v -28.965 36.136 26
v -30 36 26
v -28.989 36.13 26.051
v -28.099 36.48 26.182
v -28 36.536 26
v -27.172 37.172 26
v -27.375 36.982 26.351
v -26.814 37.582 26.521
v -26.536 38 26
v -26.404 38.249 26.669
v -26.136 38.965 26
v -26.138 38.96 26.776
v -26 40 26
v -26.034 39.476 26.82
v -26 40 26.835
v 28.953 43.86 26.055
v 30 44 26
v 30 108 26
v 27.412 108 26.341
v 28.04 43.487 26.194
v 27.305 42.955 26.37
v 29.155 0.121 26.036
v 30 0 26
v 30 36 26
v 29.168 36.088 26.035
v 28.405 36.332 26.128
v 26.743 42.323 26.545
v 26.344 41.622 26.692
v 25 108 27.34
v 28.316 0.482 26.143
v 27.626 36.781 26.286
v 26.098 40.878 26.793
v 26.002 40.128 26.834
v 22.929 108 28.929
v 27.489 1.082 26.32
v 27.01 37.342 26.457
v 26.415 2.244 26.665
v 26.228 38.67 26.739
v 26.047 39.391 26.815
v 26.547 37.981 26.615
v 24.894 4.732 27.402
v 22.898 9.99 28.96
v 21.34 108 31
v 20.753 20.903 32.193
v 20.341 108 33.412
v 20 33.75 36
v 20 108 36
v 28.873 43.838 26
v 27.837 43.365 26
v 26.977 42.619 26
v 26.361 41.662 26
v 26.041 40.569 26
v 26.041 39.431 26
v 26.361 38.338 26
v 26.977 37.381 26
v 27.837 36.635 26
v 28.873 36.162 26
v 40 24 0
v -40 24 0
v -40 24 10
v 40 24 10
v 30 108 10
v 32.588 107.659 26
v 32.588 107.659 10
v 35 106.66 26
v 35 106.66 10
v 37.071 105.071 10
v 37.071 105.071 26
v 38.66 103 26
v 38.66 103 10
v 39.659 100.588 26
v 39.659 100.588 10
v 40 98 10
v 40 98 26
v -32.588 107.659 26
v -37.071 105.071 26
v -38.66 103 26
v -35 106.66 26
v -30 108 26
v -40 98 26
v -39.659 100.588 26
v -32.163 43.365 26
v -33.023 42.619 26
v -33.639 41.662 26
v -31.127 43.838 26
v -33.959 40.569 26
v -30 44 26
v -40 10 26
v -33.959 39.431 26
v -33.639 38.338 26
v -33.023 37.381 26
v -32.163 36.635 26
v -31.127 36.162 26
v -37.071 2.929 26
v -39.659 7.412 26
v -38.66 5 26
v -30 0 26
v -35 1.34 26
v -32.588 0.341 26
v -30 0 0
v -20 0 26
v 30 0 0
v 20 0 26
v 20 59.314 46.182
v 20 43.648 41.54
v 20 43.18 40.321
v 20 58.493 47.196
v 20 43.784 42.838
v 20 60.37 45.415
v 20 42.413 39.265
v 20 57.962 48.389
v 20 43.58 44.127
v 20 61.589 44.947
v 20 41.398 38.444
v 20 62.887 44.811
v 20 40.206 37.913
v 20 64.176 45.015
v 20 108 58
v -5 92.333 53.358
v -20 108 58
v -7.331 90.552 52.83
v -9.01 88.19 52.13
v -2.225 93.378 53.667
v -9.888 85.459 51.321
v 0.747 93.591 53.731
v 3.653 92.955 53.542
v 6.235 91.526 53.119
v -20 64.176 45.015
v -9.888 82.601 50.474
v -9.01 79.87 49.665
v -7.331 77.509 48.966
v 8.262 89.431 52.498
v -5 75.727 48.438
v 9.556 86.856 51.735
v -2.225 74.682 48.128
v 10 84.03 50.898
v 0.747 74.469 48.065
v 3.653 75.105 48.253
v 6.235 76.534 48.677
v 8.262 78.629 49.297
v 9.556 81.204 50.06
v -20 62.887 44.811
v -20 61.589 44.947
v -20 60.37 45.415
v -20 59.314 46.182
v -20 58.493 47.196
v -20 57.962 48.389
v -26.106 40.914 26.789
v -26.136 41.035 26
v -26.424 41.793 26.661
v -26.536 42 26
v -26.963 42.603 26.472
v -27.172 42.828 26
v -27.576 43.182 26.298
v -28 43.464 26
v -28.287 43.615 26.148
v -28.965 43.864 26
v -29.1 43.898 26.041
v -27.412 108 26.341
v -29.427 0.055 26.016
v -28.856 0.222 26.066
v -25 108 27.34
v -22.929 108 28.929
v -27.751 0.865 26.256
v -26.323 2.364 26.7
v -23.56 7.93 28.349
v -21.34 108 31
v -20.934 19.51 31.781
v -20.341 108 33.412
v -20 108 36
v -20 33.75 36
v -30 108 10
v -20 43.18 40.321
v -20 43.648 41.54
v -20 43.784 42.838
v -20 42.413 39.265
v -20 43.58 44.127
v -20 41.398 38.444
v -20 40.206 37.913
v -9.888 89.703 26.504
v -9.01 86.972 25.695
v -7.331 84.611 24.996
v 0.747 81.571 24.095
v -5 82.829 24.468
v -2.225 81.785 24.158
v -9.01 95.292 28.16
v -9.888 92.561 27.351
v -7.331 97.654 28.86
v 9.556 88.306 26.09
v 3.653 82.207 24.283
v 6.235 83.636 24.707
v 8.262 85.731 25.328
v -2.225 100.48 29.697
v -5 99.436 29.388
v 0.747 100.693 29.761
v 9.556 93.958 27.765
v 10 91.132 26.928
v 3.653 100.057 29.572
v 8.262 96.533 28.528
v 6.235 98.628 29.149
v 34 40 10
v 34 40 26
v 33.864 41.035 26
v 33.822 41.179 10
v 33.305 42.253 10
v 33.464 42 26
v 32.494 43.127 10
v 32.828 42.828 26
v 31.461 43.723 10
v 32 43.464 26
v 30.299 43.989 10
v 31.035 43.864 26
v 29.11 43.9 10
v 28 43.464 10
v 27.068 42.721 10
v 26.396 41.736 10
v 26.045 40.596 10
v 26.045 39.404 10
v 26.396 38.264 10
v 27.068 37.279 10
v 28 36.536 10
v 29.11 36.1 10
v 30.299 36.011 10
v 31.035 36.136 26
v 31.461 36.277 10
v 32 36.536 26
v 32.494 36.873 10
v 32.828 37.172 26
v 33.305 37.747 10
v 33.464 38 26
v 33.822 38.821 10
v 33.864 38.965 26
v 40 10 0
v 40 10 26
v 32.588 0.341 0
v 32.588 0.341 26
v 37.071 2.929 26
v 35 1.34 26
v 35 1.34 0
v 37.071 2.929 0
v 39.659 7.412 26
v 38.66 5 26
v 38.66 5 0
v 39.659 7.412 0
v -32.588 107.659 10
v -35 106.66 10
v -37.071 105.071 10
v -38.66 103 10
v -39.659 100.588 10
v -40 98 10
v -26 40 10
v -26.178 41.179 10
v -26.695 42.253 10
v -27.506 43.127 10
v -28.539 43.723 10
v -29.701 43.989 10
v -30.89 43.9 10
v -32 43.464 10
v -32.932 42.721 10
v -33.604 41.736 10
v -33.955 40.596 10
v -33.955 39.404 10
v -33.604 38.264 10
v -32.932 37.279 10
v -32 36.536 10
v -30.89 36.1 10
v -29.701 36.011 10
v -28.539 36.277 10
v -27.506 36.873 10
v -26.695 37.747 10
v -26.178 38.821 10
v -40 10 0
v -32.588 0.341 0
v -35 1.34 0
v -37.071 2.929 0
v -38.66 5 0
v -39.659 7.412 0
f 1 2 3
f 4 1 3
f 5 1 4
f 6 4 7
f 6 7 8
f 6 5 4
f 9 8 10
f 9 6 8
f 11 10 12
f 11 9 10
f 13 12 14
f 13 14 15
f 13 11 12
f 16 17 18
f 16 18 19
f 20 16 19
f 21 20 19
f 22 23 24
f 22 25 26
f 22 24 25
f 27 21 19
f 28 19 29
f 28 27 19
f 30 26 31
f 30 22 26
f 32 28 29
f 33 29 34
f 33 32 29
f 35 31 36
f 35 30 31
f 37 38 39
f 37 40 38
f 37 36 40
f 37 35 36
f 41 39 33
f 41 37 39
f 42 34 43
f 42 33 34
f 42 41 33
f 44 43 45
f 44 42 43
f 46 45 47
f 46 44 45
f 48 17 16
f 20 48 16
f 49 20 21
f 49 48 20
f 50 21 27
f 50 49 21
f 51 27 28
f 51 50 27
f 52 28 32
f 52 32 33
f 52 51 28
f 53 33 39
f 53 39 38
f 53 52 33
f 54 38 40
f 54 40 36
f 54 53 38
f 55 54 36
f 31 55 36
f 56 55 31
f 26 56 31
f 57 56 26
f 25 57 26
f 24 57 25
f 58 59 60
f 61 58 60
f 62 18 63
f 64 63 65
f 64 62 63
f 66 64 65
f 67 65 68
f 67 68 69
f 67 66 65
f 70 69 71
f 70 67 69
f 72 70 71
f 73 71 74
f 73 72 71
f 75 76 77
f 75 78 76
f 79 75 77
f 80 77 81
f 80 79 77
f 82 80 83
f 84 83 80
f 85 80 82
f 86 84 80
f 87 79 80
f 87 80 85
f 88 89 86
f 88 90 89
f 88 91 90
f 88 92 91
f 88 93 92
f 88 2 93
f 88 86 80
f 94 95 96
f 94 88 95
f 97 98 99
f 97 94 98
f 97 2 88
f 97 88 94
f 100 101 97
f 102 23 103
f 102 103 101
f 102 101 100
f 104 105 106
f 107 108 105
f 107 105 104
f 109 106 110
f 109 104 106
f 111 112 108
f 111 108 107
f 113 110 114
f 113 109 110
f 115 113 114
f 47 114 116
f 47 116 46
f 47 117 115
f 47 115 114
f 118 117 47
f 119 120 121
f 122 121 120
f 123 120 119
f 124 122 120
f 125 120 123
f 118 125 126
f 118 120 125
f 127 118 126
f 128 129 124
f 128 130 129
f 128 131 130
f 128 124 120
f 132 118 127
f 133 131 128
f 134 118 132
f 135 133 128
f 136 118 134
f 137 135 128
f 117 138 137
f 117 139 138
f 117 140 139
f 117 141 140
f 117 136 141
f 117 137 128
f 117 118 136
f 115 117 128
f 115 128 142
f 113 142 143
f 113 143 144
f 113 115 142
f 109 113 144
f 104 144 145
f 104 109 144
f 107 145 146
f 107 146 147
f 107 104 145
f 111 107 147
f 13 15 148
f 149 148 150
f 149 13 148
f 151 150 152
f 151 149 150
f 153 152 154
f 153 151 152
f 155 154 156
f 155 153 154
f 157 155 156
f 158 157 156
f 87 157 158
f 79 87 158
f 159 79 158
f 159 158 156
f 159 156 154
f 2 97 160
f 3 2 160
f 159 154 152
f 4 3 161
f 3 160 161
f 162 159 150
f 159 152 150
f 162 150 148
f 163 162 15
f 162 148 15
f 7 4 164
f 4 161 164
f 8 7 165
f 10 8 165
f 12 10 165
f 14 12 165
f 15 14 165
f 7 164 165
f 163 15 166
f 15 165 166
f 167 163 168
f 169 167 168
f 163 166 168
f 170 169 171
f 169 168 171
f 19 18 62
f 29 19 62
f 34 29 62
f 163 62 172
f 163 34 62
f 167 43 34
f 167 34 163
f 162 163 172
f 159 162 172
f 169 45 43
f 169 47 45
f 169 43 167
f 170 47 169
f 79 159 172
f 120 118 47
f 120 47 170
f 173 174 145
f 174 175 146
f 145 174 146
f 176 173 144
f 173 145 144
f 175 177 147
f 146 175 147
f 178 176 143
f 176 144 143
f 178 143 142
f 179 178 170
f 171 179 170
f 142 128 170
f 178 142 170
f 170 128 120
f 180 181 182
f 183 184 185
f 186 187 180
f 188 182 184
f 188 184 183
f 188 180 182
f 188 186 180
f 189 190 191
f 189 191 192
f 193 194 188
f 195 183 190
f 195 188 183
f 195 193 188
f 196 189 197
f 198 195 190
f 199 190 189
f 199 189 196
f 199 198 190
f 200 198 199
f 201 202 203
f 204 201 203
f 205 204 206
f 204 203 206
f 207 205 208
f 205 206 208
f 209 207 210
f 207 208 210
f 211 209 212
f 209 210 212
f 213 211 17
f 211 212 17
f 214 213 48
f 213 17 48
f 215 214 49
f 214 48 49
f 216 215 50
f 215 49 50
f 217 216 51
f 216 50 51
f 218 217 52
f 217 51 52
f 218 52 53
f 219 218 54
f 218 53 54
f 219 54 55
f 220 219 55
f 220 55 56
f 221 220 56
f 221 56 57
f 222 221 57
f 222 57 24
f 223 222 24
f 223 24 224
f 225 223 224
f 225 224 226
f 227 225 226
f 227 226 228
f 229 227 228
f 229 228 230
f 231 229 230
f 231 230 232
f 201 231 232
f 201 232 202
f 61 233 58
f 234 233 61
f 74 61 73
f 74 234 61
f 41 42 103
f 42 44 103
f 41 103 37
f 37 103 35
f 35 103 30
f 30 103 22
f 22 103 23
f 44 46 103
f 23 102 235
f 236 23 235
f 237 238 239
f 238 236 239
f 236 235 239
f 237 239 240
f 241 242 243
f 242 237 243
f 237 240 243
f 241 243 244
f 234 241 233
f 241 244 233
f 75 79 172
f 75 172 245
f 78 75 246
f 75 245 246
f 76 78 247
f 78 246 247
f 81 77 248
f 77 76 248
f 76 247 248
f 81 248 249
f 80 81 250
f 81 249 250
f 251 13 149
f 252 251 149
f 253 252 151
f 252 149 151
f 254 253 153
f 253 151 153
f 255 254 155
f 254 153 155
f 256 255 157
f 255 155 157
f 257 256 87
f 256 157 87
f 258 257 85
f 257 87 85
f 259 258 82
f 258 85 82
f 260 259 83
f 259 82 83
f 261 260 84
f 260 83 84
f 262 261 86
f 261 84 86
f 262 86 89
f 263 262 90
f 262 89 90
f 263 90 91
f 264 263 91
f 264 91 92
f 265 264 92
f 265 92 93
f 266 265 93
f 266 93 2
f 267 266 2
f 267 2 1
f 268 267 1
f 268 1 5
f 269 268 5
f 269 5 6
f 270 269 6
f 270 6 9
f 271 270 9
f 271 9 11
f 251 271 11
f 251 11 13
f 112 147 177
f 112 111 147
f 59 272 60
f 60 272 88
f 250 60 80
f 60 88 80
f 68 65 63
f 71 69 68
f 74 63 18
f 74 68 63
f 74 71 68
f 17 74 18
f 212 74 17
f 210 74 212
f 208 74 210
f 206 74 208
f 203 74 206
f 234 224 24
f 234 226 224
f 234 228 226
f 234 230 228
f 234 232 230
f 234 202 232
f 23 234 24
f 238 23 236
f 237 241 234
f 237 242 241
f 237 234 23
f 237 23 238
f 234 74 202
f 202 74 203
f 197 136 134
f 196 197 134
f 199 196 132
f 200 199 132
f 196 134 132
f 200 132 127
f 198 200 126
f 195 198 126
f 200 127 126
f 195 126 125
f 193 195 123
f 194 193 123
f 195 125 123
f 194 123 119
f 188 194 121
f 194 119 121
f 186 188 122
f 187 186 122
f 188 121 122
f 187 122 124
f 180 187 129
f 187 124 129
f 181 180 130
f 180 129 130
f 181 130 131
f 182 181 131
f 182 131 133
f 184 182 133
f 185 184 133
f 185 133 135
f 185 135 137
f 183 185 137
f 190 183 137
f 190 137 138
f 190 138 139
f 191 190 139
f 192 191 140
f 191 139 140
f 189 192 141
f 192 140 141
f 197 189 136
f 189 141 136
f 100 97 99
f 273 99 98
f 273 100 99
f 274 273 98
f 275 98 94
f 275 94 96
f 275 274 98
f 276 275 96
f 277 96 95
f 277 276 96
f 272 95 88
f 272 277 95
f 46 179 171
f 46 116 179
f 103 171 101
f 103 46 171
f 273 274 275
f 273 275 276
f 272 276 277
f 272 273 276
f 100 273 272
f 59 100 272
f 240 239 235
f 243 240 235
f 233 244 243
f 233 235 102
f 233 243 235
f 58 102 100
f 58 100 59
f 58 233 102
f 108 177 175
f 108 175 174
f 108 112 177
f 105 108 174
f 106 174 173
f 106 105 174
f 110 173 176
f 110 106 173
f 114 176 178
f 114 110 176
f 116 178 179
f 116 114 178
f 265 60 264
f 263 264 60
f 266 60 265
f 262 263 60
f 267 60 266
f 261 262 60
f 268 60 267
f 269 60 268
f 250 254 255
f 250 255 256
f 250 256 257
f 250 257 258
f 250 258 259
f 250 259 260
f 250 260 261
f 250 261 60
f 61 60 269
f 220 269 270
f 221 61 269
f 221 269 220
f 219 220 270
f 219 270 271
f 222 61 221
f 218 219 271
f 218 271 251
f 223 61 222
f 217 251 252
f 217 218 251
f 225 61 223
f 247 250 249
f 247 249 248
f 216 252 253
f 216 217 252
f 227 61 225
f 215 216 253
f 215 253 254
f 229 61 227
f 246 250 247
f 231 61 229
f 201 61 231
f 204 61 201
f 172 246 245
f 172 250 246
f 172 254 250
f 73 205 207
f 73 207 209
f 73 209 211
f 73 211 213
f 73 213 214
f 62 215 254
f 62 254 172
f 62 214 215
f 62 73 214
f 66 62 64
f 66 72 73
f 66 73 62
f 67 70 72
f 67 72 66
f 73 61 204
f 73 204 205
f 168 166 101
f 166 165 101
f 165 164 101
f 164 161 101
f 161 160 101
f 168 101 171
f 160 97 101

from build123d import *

# Parameters (mm, degrees)
F1_DEPTH     = 20
F2_DEPTH     = 40
F3_T4_DEPTH  = 108
F3_T9_DEPTH  = 108
F3_T11_DEPTH = 76
F3_T13_DEPTH = 66
F4_R         = 10
F5_DEPTH     = 25
F6_R         = 4
F7_DEPTH     = 16
F8_DEPTH     = 25


# Not quite as in the source:
# - a fillet or chamfer that OpenCascade refuses, or shapes differently, is made with other operations: its cross-section is extruded or revolved along the edge and cut away or added


with BuildPart() as f1:
    # F0 (on Right) → F1 (new body, symmetric)
    with BuildSketch(Plane.YZ):
        with BuildLine():
            Line((40.2060094365, 37.9128916849), (0, 26))
            Line((0, 26), (108, 26))
            Line((108, 26), (108, 58))
            Line((108, 58), (64.1759622542, 45.0150999272))
            ThreePointArc((64.1759622542, 45.0150999272), (60.3700612912, 45.4148233324), (57.9615300422, 48.3886488422))
            Line((57.9615300422, 48.3886488422), (43.5795583515, 44.1273238969))
            ThreePointArc((43.5795583515, 44.1273238969), (43.1798349463, 40.3214229339), (40.2060094365, 37.9128916849))
        make_face()
    extrude(amount=F1_DEPTH, both=True)

    # F0 (on Right) → F2 (join, symmetric)
    with BuildSketch(Plane.YZ):
        Polygon((0, 26), (0, 0), (24, 0), (24, 10), (108, 10), (108, 26), align=None)
    extrude(amount=F2_DEPTH, both=True)

    # F3: fillet of radius 10 on 6 edges, made by hand


with BuildPart() as f3_tool2:
    # F3_s3 → F3_t4 (new body)
    with BuildSketch(Plane.XZ):
        with BuildLine():
            ThreePointArc((30, 26), (22.9289321881, 28.9289321881), (20, 36))
            Line((20, 36), (20, 26))
            Line((20, 26), (30, 26))
        make_face()
    extrude(amount=-F3_T4_DEPTH)

    split(bisect_by=Plane(origin=(0, -7.0819672131, 23.9016393443), x_dir=(1, 0, 0), z_dir=(0, 0.2840883297, -0.9587981127)), keep=Keep.TOP)


with BuildPart() as f1_1:
    add(f1.part)

    # F3_t1: union F3_tool2
    add(f3_tool2.part)


with BuildPart() as f3_tool7:
    # F3_s8 → F3_t9 (new body)
    with BuildSketch(Plane.XZ):
        with BuildLine():
            ThreePointArc((-30, 26), (-22.9289321881, 28.9289321881), (-20, 36))
            Line((-20, 36), (-20, 26))
            Line((-20, 26), (-30, 26))
        make_face()
    extrude(amount=-F3_T9_DEPTH)

    split(bisect_by=Plane(origin=(0, -7.0819672131, 23.9016393443), x_dir=(1, 0, 0), z_dir=(0, 0.2840883297, -0.9587981127)), keep=Keep.TOP)


with BuildPart() as f1_2:
    add(f1_1.part)

    # F3_t6: union F3_tool7
    add(f3_tool7.part)

    # F3_s12 → F3_t11 (cut)
    with BuildSketch(Plane.XY.offset(-25)):
        with BuildLine():
            ThreePointArc((30, 0), (37.0710678119, 2.9289321881), (40, 10))
            Line((40, 10), (40, 0))
            Line((40, 0), (30, 0))
        make_face()
        with BuildLine():
            ThreePointArc((-30, 0), (-37.0710678119, 2.9289321881), (-40, 10))
            Line((-40, 10), (-40, 0))
            Line((-40, 0), (-30, 0))
        make_face()
    extrude(amount=F3_T11_DEPTH, mode=Mode.SUBTRACT)

    # F3_s14 → F3_t13 (cut)
    with BuildSketch(Plane.XY.offset(-15)):
        with BuildLine():
            ThreePointArc((30, 108), (37.0710678119, 105.0710678119), (40, 98))
            Line((40, 98), (40, 108))
            Line((40, 108), (30, 108))
        make_face()
        with BuildLine():
            ThreePointArc((-30, 108), (-37.0710678119, 105.0710678119), (-40, 98))
            Line((-40, 98), (-40, 108))
            Line((-40, 108), (-30, 108))
        make_face()
    extrude(amount=F3_T13_DEPTH, mode=Mode.SUBTRACT)

    # F4 (on face) → F5 (cut)
    with BuildSketch(Plane(origin=(0, -7.0819672131, 23.9016393443), x_dir=(1, 0, 0), z_dir=(0, -0.2840883297, 0.9587981127))):
        with Locations((0, 95.0273192946)):
            Circle(F4_R)
    extrude(amount=-F5_DEPTH, mode=Mode.SUBTRACT)

    # F6 (on face) → F7 (cut, through all)
    with BuildSketch(Plane.XY.offset(26)):
        with Locations((30, 40)):
            Circle(F6_R)
        with Locations((-30, 40)):
            Circle(F6_R)
    extrude(amount=-F7_DEPTH, mode=Mode.SUBTRACT)

    # F6 (on face) → F8 (cut)
    with BuildSketch(Plane.XY.offset(26)):
        with Locations((30, 40)):
            Circle(F6_R)
        with Locations((-30, 40)):
            Circle(F6_R)
    extrude(amount=F8_DEPTH, mode=Mode.SUBTRACT)


solid = f1_2.part
